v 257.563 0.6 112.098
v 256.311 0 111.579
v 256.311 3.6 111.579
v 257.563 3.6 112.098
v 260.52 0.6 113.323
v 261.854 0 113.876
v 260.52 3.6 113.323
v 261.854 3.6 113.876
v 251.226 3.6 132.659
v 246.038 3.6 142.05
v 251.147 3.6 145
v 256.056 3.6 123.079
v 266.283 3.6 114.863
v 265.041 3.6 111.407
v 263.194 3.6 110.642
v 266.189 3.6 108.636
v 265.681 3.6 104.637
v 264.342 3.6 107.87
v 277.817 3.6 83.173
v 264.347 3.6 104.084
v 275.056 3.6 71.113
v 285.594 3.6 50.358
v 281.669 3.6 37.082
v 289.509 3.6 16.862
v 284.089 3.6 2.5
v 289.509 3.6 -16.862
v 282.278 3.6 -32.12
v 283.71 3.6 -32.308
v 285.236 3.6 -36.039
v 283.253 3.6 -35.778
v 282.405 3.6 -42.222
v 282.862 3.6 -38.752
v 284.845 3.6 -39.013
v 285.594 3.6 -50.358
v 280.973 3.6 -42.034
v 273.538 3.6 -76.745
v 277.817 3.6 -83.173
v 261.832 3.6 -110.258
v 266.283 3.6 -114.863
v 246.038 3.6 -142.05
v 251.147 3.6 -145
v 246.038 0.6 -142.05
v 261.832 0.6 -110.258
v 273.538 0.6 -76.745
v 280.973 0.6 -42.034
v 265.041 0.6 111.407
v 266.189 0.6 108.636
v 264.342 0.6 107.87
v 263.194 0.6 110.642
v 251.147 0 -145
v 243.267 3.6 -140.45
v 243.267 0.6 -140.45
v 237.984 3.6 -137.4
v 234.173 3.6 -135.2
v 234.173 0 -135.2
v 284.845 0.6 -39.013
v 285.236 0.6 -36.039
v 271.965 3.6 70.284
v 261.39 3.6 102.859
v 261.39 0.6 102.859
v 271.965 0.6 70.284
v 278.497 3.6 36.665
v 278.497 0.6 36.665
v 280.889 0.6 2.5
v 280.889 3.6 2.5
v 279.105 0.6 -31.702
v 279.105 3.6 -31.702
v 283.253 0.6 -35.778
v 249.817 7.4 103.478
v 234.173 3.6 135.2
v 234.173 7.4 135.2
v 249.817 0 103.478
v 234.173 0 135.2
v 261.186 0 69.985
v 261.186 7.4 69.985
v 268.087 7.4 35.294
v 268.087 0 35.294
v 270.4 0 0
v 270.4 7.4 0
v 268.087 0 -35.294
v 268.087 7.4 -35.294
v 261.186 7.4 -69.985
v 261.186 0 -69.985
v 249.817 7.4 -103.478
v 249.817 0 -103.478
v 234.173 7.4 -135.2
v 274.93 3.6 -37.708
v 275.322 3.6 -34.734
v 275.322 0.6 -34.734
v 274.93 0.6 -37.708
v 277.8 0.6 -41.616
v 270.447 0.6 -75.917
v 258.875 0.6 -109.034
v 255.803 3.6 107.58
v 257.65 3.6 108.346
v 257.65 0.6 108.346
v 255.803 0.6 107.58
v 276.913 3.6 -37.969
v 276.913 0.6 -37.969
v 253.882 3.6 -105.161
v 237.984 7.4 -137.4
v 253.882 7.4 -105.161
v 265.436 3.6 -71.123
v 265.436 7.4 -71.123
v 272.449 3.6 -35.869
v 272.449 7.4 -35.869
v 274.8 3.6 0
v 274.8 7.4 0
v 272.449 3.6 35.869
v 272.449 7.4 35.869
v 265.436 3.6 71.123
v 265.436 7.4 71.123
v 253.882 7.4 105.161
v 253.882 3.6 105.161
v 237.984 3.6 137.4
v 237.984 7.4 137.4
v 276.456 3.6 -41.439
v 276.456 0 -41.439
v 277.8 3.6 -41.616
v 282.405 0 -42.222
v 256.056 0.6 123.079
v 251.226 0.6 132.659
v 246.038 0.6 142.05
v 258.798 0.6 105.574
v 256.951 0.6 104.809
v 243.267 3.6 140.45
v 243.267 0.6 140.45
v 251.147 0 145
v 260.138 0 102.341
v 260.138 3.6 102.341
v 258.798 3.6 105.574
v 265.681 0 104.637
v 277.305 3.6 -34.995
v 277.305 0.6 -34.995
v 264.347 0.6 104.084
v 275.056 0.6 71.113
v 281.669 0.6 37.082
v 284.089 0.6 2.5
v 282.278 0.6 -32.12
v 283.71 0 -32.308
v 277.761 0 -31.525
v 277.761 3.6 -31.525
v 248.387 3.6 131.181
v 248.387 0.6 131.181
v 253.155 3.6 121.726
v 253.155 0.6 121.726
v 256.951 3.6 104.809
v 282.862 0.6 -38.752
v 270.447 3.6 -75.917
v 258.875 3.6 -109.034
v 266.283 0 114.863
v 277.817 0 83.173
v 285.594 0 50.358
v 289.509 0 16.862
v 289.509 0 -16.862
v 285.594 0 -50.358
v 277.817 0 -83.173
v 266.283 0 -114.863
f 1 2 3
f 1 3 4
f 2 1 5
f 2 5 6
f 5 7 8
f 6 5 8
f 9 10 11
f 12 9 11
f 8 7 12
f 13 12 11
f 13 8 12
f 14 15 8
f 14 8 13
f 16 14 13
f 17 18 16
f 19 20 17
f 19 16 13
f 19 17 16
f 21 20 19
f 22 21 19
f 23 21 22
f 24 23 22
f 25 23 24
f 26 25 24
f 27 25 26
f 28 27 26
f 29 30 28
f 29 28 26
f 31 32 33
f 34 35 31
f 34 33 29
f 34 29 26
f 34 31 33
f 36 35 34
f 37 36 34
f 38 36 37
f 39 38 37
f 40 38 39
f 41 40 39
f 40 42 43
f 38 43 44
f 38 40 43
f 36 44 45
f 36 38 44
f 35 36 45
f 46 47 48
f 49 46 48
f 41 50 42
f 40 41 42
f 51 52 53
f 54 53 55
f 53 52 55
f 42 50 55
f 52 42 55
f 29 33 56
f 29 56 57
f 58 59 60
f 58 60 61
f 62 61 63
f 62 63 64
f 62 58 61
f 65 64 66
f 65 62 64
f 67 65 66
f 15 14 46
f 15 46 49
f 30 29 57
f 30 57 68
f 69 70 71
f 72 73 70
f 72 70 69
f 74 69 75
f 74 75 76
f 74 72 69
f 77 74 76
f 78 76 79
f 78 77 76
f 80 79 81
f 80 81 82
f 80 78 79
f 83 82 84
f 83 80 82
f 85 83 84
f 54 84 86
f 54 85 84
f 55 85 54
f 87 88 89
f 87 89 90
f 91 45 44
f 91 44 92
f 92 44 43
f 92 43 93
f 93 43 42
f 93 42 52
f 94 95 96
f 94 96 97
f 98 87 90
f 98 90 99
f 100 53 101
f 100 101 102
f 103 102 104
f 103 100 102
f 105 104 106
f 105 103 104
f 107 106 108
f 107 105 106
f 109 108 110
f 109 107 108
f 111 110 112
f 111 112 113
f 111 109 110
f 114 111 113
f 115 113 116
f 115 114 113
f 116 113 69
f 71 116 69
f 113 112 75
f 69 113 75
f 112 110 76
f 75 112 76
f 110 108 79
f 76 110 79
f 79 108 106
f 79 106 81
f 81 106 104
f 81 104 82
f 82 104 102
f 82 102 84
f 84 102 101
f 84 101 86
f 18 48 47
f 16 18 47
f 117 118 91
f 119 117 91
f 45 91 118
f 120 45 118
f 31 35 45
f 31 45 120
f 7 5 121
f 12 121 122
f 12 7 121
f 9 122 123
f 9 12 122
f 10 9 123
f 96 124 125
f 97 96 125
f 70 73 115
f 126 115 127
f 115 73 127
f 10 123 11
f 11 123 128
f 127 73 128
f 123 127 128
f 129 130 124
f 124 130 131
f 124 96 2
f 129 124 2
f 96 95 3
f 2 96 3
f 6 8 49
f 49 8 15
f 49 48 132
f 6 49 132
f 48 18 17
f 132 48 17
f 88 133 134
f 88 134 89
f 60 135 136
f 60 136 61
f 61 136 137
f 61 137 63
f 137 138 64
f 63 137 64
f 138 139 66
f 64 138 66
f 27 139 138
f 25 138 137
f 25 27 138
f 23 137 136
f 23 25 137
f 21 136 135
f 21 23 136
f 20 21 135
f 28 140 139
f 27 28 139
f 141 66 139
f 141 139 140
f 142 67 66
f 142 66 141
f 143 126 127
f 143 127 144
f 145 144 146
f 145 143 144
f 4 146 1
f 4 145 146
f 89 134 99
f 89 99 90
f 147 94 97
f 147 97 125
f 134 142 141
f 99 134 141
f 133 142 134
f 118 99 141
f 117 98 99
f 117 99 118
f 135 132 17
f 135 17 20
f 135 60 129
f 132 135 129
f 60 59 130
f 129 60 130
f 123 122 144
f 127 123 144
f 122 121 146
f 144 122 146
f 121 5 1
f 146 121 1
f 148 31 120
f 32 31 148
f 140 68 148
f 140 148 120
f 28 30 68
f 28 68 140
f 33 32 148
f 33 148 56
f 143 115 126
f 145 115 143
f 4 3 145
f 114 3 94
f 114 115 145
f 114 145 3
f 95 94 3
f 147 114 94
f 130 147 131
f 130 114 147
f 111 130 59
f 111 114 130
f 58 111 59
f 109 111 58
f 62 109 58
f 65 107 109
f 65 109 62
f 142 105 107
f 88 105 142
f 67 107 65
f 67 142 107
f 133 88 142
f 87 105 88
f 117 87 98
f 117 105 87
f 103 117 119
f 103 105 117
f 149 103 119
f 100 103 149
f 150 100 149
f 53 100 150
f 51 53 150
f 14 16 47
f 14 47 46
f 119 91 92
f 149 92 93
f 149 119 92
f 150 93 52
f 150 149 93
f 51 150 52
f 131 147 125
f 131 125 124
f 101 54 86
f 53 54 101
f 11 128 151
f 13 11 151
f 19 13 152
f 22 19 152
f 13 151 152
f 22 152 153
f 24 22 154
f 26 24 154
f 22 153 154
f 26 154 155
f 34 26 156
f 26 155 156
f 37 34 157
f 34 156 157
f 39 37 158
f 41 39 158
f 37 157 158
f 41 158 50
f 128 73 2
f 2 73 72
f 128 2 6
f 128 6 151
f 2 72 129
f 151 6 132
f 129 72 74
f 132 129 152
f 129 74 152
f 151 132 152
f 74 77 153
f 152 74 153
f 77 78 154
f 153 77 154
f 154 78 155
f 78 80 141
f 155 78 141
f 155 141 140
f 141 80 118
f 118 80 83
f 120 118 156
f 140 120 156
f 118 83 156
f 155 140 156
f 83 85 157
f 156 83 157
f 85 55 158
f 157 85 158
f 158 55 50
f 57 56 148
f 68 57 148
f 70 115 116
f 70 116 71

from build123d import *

# Parameters (mm, degrees)
AUFSATZ_LINEAR_AUSTRAGEN1_DEPTH = 3.6
SCHNITT_LINEAR_AUSTRAGEN1_DEPTH = 3
SCHNITT_LINEAR_AUSTRAGEN2_DEPTH = 325.249841943
SCHNITT_LINEAR_AUSTRAGEN3_DEPTH = 3
AUFSATZ_LINEAR_AUSTRAGEN2_DEPTH = 3.8


with BuildPart() as part:
    # Skizze1 → Aufsatz-Linear austragen1 (new body)
    with BuildSketch(Plane(origin=(0, 0, 0), x_dir=(1, 0, 0), z_dir=(0, 1, 0))):
        with BuildLine():
            Line((251.147367097, 145), (234.173269183, 135.2))
            ThreePointArc((234.173269183, 135.2), (270.4, 0), (234.173269183, -135.2))
            Line((234.173269183, -135.2), (251.147367097, -145))
            ThreePointArc((251.147367097, -145), (290, 0), (251.147367097, 145))
        make_face()
    extrude(amount=AUFSATZ_LINEAR_AUSTRAGEN1_DEPTH)

    # Skizze2 → Schnitt-Linear austragen1 (cut)
    with BuildSketch(Plane(origin=(0, 3.6, 0), x_dir=(1, 0, 0), z_dir=(0, 1, 0))):
        with BuildLine():
            Line((243.266535923, 140.45), (246.037817215, 142.05))
            ThreePointArc((246.037817215, 142.05), (284.1, 0), (246.037817215, -142.05))
            Line((246.037817215, -142.05), (243.266535923, -140.45))
            ThreePointArc((243.266535923, -140.45), (280.9, 0), (243.266535923, 140.45))
        make_face()
    extrude(amount=-SCHNITT_LINEAR_AUSTRAGEN1_DEPTH, mode=Mode.SUBTRACT)

    # Skizze3 → Schnitt-Linear austragen2 (cut, through all)
    with BuildSketch(Plane(origin=(0, 3.6, 0), x_dir=(1, 0, 0), z_dir=(0, 1, 0))):
        Polygon((276.456207793, 41.439295032), (282.404876961, 42.222452186), (283.710138883, 32.308003572), (277.761469715, 31.524846419), align=None)
        Polygon((256.310912175, -111.579417009), (261.85418937, -113.875517603), (265.681023694, -104.636722278), (260.137746499, -102.340621683), align=None)
    extrude(amount=-SCHNITT_LINEAR_AUSTRAGEN2_DEPTH, mode=Mode.SUBTRACT)

    # Skizze4 → Schnitt-Linear austragen3 (cut)
    with BuildSketch(Plane(origin=(0, 3.6, 0), x_dir=(1, 0, 0), z_dir=(0, 1, 0))):
        Polygon((256.95059542, -104.808833183), (266.189390746, -108.635667506), (265.041340448, -111.407306104), (255.802545123, -107.58047178), align=None)
        Polygon((274.930159743, 37.708185633), (284.844608357, 39.013447555), (285.236186933, 36.039112971), (275.32173832, 34.733851049), align=None)
    extrude(amount=-SCHNITT_LINEAR_AUSTRAGEN3_DEPTH, mode=Mode.SUBTRACT)

    # Skizze5 → Aufsatz-Linear austragen2 (add)
    with BuildSketch(Plane(origin=(0, 3.6, 0), x_dir=(1, 0, 0), z_dir=(0, 1, 0))):
        with BuildLine():
            Line((234.173269183, 135.2), (237.98378096, 137.4))
            ThreePointArc((237.98378096, 137.4), (274.8, 0), (237.98378096, -137.4))
            Line((237.98378096, -137.4), (234.173269183, -135.2))
            ThreePointArc((234.173269183, -135.2), (270.4, 0), (234.173269183, 135.2))
        make_face()
    extrude(amount=AUFSATZ_LINEAR_AUSTRAGEN2_DEPTH)


solid = part.part
